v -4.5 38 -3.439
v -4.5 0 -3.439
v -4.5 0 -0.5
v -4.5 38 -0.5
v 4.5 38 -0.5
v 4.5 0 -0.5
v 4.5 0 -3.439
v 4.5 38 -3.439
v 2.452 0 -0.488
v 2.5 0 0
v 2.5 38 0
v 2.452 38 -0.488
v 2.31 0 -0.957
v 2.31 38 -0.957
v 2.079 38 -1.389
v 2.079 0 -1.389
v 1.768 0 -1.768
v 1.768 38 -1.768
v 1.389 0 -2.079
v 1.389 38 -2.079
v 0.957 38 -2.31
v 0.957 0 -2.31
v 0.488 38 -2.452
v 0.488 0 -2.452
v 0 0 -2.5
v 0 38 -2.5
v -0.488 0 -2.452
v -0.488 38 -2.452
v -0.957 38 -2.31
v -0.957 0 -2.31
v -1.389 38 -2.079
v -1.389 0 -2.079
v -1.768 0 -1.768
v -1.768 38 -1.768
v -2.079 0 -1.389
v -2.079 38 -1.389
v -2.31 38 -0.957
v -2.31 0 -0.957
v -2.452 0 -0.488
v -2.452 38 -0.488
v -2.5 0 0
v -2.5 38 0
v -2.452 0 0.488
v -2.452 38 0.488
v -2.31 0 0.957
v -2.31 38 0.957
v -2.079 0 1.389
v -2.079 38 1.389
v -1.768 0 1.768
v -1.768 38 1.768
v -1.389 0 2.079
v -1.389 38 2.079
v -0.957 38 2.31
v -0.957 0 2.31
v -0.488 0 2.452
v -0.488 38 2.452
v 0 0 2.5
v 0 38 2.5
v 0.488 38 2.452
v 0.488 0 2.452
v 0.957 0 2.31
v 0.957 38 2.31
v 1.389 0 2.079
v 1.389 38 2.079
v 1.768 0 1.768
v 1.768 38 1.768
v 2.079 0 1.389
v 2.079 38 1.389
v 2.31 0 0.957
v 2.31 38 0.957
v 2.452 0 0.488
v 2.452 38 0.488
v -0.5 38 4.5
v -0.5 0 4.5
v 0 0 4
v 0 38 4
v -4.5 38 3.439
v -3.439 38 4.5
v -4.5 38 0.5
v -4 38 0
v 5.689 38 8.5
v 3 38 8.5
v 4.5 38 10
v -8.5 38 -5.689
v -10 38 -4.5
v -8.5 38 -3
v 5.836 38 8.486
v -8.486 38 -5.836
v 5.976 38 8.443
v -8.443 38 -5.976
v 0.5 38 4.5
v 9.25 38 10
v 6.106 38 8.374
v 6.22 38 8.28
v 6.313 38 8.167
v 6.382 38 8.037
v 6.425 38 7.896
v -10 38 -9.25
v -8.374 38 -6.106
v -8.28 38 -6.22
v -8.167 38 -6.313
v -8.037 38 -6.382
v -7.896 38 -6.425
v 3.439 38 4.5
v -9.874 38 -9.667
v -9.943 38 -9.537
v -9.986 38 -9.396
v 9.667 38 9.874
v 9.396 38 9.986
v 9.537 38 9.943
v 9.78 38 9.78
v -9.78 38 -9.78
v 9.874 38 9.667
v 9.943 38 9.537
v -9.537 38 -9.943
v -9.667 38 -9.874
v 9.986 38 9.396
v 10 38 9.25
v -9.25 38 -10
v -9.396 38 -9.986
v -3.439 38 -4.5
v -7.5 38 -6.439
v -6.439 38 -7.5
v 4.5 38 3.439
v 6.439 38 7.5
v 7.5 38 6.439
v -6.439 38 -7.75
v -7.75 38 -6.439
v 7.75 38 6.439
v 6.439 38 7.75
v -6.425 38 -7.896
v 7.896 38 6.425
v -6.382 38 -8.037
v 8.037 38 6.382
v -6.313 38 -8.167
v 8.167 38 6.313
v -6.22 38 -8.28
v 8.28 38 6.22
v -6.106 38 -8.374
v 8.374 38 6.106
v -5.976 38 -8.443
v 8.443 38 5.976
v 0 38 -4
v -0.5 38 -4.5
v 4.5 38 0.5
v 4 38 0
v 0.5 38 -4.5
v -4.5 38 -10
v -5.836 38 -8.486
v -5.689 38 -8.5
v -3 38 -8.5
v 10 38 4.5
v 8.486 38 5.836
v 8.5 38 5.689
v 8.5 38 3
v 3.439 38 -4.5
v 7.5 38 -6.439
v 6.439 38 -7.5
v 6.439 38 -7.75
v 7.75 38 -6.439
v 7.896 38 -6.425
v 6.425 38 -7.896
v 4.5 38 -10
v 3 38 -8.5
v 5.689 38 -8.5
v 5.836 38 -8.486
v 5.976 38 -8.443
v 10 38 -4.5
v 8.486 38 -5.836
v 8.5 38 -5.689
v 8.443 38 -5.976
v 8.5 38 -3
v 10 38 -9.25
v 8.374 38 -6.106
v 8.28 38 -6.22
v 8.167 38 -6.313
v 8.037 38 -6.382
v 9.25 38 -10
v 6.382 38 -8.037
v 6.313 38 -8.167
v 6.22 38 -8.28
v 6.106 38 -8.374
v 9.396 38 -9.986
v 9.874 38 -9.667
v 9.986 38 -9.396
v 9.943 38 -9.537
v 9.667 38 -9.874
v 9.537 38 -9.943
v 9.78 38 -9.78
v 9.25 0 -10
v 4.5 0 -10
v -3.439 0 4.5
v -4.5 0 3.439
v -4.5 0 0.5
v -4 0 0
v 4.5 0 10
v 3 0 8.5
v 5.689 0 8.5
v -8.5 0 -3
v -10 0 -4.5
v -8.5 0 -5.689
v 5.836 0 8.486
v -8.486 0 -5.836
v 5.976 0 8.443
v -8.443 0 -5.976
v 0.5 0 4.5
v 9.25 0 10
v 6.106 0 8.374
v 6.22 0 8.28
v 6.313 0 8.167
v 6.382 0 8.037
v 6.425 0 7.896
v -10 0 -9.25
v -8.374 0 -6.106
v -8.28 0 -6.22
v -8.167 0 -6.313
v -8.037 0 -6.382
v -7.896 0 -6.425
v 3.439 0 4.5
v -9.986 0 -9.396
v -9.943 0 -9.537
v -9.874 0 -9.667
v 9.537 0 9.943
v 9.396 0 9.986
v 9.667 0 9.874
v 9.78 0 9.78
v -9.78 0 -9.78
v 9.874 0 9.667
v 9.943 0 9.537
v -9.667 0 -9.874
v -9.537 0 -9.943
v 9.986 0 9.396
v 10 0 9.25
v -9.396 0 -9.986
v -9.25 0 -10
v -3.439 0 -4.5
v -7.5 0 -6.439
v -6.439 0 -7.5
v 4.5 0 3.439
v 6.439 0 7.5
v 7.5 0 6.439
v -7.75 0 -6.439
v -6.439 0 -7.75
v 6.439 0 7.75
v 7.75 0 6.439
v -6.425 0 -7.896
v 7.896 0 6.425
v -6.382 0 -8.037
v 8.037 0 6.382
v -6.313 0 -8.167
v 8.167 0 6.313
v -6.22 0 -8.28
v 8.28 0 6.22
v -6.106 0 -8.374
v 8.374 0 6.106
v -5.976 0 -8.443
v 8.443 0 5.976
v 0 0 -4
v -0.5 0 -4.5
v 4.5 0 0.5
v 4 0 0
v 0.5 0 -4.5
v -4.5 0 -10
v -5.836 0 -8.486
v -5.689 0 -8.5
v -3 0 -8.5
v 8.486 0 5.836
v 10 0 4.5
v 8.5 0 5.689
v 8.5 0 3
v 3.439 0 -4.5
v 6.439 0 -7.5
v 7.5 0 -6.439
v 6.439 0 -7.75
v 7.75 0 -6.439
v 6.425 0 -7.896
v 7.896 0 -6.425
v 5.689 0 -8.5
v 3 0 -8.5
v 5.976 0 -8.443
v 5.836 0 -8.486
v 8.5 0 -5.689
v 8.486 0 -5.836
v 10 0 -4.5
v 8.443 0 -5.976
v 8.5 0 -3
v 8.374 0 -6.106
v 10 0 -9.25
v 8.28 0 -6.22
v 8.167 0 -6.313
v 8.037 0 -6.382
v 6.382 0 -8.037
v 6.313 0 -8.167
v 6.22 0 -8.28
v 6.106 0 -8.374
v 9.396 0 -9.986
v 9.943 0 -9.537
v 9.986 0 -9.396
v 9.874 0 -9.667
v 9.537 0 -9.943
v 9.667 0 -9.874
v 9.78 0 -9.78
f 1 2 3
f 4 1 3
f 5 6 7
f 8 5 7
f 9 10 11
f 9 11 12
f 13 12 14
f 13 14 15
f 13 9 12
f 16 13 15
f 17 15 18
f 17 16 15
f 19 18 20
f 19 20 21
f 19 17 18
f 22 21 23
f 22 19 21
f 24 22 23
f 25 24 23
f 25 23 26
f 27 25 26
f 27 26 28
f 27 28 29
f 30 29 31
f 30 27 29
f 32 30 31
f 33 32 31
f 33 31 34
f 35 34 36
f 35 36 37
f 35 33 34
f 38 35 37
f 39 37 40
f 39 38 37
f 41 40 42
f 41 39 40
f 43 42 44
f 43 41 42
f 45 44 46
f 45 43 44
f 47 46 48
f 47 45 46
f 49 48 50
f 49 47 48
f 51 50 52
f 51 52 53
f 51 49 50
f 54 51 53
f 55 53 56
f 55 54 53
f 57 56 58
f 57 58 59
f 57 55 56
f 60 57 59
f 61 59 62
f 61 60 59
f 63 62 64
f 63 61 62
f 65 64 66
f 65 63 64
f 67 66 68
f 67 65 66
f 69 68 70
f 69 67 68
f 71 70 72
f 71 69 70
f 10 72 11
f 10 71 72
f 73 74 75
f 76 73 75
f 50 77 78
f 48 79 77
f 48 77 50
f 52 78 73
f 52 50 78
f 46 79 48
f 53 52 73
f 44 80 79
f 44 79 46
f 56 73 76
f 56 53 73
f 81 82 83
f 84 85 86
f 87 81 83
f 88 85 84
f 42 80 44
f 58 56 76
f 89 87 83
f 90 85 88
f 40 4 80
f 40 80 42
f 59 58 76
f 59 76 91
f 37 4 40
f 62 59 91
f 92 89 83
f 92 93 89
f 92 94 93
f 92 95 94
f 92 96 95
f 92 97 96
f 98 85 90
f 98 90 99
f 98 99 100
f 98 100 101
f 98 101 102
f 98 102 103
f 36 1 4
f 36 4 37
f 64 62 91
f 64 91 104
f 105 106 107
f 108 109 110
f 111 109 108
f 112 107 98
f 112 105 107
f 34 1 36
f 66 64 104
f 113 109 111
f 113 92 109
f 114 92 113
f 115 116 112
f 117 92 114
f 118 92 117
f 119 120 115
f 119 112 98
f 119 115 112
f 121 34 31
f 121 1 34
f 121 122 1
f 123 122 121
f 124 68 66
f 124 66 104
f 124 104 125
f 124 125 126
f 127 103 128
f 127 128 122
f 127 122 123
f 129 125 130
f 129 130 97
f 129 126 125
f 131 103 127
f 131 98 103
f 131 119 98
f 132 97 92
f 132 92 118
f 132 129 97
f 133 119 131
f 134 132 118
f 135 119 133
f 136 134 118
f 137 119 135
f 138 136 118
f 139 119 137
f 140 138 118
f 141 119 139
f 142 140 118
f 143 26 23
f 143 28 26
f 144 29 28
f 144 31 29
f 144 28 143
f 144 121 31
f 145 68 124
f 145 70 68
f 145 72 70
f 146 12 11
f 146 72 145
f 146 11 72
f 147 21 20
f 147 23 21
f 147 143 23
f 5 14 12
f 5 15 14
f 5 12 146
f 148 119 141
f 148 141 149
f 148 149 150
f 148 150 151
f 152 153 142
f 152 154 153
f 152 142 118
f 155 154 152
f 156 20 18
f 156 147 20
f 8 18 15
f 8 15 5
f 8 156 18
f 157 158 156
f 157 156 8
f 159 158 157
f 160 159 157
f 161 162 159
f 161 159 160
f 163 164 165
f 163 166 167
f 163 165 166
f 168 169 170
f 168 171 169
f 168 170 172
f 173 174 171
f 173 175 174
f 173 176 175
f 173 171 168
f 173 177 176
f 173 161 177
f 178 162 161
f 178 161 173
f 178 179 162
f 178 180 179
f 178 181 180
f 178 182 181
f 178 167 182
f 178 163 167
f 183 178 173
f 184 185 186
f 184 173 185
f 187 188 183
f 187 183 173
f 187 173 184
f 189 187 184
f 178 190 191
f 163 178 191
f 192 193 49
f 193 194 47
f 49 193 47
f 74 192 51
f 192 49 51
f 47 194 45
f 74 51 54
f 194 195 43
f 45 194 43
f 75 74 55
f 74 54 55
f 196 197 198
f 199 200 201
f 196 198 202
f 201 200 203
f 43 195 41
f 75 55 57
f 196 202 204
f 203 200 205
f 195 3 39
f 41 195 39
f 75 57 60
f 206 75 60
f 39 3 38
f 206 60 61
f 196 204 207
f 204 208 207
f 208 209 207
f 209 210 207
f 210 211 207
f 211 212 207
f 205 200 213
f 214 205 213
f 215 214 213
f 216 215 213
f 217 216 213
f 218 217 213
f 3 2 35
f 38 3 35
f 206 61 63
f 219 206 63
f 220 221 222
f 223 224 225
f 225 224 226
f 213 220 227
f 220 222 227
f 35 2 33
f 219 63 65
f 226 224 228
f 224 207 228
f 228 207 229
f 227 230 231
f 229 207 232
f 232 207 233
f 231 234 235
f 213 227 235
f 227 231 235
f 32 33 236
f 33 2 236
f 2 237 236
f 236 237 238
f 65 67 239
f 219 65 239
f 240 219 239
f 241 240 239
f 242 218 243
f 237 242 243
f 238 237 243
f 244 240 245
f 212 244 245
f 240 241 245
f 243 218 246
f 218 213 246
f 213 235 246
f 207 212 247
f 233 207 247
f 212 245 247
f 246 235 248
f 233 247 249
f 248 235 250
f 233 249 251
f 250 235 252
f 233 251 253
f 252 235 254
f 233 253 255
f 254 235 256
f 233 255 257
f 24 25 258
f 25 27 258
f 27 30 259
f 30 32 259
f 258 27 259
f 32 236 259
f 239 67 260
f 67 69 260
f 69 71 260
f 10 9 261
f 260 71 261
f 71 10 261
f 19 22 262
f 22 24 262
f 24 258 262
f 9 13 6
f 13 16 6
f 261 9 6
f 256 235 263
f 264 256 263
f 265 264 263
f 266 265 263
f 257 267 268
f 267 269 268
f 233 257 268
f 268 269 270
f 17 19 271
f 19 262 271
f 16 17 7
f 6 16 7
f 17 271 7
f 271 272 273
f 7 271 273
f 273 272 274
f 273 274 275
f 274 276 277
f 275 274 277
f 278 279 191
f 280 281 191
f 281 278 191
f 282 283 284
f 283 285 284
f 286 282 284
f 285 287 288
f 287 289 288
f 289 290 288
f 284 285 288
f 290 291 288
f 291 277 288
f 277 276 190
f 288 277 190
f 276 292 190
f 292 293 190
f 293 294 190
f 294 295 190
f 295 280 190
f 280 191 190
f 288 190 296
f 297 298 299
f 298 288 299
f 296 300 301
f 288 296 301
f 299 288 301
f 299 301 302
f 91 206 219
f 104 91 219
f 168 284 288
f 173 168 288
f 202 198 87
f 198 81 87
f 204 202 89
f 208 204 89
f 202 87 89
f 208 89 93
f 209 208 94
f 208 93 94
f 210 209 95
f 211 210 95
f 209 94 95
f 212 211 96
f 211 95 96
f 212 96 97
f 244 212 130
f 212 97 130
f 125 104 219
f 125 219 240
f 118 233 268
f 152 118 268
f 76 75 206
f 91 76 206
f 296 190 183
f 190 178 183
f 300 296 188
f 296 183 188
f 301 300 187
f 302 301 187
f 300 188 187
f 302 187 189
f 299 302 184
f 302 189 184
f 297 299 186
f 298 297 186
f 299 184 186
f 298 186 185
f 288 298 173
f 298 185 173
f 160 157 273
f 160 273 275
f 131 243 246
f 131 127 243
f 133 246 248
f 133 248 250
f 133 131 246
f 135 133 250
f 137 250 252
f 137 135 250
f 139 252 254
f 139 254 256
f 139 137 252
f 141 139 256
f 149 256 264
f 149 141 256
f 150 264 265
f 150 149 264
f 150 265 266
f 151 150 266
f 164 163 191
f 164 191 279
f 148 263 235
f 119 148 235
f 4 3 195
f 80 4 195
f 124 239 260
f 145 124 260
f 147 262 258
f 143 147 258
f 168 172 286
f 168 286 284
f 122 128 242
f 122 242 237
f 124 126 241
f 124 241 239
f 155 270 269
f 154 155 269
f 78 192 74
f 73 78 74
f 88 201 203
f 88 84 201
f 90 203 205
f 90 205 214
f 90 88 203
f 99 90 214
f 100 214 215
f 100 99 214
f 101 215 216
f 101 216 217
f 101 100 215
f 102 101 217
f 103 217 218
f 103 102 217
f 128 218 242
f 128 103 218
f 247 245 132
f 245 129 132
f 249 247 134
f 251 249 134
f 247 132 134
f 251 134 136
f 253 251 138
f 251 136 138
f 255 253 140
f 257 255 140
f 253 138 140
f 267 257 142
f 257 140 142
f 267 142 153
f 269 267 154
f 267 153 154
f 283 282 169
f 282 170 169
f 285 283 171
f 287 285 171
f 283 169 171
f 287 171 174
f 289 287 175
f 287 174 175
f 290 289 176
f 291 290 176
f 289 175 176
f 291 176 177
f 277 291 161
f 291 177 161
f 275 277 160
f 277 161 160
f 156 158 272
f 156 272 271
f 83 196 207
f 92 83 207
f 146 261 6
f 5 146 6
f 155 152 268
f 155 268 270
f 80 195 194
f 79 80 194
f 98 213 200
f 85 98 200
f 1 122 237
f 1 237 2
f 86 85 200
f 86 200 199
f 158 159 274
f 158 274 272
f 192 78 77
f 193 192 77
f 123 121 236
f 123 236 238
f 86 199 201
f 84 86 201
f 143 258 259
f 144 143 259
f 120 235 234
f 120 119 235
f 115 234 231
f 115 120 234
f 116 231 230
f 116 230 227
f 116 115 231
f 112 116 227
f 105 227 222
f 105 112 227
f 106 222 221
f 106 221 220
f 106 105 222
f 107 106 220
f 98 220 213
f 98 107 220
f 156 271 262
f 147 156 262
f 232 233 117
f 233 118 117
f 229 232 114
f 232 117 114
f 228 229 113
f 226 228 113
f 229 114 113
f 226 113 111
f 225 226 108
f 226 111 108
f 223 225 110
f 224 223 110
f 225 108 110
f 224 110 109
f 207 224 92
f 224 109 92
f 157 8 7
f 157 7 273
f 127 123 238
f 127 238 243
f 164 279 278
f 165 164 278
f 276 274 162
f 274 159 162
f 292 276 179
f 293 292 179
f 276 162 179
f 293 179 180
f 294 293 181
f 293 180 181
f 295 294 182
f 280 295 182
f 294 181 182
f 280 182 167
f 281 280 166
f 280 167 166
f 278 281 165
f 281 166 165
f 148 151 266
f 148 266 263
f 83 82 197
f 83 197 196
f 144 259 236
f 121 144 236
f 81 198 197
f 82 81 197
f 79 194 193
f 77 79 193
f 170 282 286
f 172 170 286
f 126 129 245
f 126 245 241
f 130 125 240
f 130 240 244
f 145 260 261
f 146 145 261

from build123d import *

# Parameters (mm, degrees)
ESQUISSE1_R      = 2.5
EXTRUSION1_DEPTH = 38
CONG_1_R         = 0.75
EXTRUSION2_REACH = 40


with BuildPart() as part:
    # Esquisse1 → Extrusion1 (new body)
    with BuildSketch(Plane(origin=(0, 0, 0), x_dir=(1, 0, 0), z_dir=(0, 1, 0))):
        Polygon((0, 4), (-0.5, 4.5), (-3.439339828, 4.5), (-6.439339828, 7.5), (-6.439339828, 8.5), (-3, 8.5), (-4.5, 10), (-10, 10), (-10, 4.5), (-8.5, 3), (-8.5, 6.439339828), (-7.5, 6.439339828), (-4.5, 3.439339828), (-4.5, 0.5), (-4, 0), (-4.5, -0.5), (-4.5, -3.439339828), (-7.5, -6.439339828), (-8.5, -6.439339828), (-8.5, -3), (-10, -4.5), (-10, -10), (-4.5, -10), (-3, -8.5), (-6.439339828, -8.5), (-6.439339828, -7.5), (-3.439339828, -4.5), (-0.5, -4.5), (0, -4), (0.5, -4.5), (3.439339828, -4.5), (6.439339828, -7.5), (6.439339828, -8.5), (3, -8.5), (4.5, -10), (10, -10), (10, -4.5), (8.5, -3), (8.5, -6.439339828), (7.5, -6.439339828), (4.5, -3.439339828), (4.5, -0.5), (4, 0), (4.5, 0.5), (4.5, 3.439339828), (7.5, 6.439339828), (8.5, 6.439339828), (8.5, 3), (10, 4.5), (10, 10), (4.5, 10), (3, 8.5), (6.439339828, 8.5), (6.439339828, 7.5), (3.439339828, 4.5), (0.5, 4.5), align=None)
        Circle(ESQUISSE1_R, mode=Mode.SUBTRACT)
    extrude(amount=EXTRUSION1_DEPTH)

    # Congé1
    cong_1_edges = [part.edges().sort_by_distance(p)[0] for p in [
        (6.439339828, 19, -8.5),
        (10, 19, -10),
        (8.5, 19, -6.439339828),
        (8.5, 19, 6.439339828),
        (10, 19, 10),
        (6.439339828, 19, 8.5),
        (-6.439339828, 19, 8.5),
        (-10, 19, 10),
        (-8.5, 19, 6.439339828),
        (-8.5, 19, -6.439339828),
        (-10, 19, -10),
        (-6.439339828, 19, -8.5),
    ]]
    fillet(cong_1_edges, radius=CONG_1_R)

    # Esquisse2 → Extrusion2 (cut, up to next)
    with BuildSketch(Plane(origin=(0, 38, 0), x_dir=(1, 0, 0), z_dir=(0, 1, 0)), mode=Mode.PRIVATE) as extrusion2_sk1:
        Polygon((-3.439339828, -4.5), (-4.5, -3.439339828), (-8.5, -3), (-10, -4.5), (-10, -10), (-4.5, -10), (-3, -8.5), align=None)
    extrusion2_tool1 = extrude(extrusion2_sk1.sketch, amount=-EXTRUSION2_REACH, mode=Mode.PRIVATE) & part.part
    add(extrusion2_tool1.solids().sort_by_distance((-6.693883, 38, 6.693883))[0], mode=Mode.SUBTRACT)


solid = part.part
